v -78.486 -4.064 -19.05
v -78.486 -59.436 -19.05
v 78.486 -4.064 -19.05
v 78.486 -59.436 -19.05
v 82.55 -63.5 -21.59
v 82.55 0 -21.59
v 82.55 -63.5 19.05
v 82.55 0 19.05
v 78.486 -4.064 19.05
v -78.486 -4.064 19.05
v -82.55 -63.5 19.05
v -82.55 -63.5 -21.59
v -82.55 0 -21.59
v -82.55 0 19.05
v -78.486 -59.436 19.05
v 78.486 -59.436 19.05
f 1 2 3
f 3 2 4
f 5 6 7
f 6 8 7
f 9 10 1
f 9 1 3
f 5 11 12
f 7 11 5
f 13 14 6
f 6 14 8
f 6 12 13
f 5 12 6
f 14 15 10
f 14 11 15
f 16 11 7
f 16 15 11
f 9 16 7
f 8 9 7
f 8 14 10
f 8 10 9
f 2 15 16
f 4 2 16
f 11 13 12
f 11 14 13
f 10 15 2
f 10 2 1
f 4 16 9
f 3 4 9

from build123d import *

# Parameters (mm, degrees)
F0_W     = 165.1
F0_H     = 38.1
F1_DEPTH = 63.5
F2_W     = 156.972
F2_H     = 55.372
F3_DEPTH = 46.736
F4_W     = 165.1
F4_H     = 63.5
F5_DEPTH = 2.54


with BuildPart() as f1:
    # F0 (on Front) → F1 (new body)
    with BuildSketch(Plane.XZ):
        Rectangle(F0_W, F0_H)
    extrude(amount=F1_DEPTH)

    # F2 (on face) → F3 (cut)
    with BuildSketch(Plane.XY.offset(19.05)):
        with Locations((0, -31.75)):
            Rectangle(F2_W, F2_H)
    extrude(amount=-F3_DEPTH, mode=Mode.SUBTRACT)

    # F4 (on face) → F5 (join)
    with BuildSketch(Plane(origin=(0, 0, -19.05), x_dir=(1, 0, 0), z_dir=(0, 0, -1))):
        with Locations((0, 31.75)):
            Rectangle(F4_W, F4_H)
    extrude(amount=F5_DEPTH)


solid = f1.part
